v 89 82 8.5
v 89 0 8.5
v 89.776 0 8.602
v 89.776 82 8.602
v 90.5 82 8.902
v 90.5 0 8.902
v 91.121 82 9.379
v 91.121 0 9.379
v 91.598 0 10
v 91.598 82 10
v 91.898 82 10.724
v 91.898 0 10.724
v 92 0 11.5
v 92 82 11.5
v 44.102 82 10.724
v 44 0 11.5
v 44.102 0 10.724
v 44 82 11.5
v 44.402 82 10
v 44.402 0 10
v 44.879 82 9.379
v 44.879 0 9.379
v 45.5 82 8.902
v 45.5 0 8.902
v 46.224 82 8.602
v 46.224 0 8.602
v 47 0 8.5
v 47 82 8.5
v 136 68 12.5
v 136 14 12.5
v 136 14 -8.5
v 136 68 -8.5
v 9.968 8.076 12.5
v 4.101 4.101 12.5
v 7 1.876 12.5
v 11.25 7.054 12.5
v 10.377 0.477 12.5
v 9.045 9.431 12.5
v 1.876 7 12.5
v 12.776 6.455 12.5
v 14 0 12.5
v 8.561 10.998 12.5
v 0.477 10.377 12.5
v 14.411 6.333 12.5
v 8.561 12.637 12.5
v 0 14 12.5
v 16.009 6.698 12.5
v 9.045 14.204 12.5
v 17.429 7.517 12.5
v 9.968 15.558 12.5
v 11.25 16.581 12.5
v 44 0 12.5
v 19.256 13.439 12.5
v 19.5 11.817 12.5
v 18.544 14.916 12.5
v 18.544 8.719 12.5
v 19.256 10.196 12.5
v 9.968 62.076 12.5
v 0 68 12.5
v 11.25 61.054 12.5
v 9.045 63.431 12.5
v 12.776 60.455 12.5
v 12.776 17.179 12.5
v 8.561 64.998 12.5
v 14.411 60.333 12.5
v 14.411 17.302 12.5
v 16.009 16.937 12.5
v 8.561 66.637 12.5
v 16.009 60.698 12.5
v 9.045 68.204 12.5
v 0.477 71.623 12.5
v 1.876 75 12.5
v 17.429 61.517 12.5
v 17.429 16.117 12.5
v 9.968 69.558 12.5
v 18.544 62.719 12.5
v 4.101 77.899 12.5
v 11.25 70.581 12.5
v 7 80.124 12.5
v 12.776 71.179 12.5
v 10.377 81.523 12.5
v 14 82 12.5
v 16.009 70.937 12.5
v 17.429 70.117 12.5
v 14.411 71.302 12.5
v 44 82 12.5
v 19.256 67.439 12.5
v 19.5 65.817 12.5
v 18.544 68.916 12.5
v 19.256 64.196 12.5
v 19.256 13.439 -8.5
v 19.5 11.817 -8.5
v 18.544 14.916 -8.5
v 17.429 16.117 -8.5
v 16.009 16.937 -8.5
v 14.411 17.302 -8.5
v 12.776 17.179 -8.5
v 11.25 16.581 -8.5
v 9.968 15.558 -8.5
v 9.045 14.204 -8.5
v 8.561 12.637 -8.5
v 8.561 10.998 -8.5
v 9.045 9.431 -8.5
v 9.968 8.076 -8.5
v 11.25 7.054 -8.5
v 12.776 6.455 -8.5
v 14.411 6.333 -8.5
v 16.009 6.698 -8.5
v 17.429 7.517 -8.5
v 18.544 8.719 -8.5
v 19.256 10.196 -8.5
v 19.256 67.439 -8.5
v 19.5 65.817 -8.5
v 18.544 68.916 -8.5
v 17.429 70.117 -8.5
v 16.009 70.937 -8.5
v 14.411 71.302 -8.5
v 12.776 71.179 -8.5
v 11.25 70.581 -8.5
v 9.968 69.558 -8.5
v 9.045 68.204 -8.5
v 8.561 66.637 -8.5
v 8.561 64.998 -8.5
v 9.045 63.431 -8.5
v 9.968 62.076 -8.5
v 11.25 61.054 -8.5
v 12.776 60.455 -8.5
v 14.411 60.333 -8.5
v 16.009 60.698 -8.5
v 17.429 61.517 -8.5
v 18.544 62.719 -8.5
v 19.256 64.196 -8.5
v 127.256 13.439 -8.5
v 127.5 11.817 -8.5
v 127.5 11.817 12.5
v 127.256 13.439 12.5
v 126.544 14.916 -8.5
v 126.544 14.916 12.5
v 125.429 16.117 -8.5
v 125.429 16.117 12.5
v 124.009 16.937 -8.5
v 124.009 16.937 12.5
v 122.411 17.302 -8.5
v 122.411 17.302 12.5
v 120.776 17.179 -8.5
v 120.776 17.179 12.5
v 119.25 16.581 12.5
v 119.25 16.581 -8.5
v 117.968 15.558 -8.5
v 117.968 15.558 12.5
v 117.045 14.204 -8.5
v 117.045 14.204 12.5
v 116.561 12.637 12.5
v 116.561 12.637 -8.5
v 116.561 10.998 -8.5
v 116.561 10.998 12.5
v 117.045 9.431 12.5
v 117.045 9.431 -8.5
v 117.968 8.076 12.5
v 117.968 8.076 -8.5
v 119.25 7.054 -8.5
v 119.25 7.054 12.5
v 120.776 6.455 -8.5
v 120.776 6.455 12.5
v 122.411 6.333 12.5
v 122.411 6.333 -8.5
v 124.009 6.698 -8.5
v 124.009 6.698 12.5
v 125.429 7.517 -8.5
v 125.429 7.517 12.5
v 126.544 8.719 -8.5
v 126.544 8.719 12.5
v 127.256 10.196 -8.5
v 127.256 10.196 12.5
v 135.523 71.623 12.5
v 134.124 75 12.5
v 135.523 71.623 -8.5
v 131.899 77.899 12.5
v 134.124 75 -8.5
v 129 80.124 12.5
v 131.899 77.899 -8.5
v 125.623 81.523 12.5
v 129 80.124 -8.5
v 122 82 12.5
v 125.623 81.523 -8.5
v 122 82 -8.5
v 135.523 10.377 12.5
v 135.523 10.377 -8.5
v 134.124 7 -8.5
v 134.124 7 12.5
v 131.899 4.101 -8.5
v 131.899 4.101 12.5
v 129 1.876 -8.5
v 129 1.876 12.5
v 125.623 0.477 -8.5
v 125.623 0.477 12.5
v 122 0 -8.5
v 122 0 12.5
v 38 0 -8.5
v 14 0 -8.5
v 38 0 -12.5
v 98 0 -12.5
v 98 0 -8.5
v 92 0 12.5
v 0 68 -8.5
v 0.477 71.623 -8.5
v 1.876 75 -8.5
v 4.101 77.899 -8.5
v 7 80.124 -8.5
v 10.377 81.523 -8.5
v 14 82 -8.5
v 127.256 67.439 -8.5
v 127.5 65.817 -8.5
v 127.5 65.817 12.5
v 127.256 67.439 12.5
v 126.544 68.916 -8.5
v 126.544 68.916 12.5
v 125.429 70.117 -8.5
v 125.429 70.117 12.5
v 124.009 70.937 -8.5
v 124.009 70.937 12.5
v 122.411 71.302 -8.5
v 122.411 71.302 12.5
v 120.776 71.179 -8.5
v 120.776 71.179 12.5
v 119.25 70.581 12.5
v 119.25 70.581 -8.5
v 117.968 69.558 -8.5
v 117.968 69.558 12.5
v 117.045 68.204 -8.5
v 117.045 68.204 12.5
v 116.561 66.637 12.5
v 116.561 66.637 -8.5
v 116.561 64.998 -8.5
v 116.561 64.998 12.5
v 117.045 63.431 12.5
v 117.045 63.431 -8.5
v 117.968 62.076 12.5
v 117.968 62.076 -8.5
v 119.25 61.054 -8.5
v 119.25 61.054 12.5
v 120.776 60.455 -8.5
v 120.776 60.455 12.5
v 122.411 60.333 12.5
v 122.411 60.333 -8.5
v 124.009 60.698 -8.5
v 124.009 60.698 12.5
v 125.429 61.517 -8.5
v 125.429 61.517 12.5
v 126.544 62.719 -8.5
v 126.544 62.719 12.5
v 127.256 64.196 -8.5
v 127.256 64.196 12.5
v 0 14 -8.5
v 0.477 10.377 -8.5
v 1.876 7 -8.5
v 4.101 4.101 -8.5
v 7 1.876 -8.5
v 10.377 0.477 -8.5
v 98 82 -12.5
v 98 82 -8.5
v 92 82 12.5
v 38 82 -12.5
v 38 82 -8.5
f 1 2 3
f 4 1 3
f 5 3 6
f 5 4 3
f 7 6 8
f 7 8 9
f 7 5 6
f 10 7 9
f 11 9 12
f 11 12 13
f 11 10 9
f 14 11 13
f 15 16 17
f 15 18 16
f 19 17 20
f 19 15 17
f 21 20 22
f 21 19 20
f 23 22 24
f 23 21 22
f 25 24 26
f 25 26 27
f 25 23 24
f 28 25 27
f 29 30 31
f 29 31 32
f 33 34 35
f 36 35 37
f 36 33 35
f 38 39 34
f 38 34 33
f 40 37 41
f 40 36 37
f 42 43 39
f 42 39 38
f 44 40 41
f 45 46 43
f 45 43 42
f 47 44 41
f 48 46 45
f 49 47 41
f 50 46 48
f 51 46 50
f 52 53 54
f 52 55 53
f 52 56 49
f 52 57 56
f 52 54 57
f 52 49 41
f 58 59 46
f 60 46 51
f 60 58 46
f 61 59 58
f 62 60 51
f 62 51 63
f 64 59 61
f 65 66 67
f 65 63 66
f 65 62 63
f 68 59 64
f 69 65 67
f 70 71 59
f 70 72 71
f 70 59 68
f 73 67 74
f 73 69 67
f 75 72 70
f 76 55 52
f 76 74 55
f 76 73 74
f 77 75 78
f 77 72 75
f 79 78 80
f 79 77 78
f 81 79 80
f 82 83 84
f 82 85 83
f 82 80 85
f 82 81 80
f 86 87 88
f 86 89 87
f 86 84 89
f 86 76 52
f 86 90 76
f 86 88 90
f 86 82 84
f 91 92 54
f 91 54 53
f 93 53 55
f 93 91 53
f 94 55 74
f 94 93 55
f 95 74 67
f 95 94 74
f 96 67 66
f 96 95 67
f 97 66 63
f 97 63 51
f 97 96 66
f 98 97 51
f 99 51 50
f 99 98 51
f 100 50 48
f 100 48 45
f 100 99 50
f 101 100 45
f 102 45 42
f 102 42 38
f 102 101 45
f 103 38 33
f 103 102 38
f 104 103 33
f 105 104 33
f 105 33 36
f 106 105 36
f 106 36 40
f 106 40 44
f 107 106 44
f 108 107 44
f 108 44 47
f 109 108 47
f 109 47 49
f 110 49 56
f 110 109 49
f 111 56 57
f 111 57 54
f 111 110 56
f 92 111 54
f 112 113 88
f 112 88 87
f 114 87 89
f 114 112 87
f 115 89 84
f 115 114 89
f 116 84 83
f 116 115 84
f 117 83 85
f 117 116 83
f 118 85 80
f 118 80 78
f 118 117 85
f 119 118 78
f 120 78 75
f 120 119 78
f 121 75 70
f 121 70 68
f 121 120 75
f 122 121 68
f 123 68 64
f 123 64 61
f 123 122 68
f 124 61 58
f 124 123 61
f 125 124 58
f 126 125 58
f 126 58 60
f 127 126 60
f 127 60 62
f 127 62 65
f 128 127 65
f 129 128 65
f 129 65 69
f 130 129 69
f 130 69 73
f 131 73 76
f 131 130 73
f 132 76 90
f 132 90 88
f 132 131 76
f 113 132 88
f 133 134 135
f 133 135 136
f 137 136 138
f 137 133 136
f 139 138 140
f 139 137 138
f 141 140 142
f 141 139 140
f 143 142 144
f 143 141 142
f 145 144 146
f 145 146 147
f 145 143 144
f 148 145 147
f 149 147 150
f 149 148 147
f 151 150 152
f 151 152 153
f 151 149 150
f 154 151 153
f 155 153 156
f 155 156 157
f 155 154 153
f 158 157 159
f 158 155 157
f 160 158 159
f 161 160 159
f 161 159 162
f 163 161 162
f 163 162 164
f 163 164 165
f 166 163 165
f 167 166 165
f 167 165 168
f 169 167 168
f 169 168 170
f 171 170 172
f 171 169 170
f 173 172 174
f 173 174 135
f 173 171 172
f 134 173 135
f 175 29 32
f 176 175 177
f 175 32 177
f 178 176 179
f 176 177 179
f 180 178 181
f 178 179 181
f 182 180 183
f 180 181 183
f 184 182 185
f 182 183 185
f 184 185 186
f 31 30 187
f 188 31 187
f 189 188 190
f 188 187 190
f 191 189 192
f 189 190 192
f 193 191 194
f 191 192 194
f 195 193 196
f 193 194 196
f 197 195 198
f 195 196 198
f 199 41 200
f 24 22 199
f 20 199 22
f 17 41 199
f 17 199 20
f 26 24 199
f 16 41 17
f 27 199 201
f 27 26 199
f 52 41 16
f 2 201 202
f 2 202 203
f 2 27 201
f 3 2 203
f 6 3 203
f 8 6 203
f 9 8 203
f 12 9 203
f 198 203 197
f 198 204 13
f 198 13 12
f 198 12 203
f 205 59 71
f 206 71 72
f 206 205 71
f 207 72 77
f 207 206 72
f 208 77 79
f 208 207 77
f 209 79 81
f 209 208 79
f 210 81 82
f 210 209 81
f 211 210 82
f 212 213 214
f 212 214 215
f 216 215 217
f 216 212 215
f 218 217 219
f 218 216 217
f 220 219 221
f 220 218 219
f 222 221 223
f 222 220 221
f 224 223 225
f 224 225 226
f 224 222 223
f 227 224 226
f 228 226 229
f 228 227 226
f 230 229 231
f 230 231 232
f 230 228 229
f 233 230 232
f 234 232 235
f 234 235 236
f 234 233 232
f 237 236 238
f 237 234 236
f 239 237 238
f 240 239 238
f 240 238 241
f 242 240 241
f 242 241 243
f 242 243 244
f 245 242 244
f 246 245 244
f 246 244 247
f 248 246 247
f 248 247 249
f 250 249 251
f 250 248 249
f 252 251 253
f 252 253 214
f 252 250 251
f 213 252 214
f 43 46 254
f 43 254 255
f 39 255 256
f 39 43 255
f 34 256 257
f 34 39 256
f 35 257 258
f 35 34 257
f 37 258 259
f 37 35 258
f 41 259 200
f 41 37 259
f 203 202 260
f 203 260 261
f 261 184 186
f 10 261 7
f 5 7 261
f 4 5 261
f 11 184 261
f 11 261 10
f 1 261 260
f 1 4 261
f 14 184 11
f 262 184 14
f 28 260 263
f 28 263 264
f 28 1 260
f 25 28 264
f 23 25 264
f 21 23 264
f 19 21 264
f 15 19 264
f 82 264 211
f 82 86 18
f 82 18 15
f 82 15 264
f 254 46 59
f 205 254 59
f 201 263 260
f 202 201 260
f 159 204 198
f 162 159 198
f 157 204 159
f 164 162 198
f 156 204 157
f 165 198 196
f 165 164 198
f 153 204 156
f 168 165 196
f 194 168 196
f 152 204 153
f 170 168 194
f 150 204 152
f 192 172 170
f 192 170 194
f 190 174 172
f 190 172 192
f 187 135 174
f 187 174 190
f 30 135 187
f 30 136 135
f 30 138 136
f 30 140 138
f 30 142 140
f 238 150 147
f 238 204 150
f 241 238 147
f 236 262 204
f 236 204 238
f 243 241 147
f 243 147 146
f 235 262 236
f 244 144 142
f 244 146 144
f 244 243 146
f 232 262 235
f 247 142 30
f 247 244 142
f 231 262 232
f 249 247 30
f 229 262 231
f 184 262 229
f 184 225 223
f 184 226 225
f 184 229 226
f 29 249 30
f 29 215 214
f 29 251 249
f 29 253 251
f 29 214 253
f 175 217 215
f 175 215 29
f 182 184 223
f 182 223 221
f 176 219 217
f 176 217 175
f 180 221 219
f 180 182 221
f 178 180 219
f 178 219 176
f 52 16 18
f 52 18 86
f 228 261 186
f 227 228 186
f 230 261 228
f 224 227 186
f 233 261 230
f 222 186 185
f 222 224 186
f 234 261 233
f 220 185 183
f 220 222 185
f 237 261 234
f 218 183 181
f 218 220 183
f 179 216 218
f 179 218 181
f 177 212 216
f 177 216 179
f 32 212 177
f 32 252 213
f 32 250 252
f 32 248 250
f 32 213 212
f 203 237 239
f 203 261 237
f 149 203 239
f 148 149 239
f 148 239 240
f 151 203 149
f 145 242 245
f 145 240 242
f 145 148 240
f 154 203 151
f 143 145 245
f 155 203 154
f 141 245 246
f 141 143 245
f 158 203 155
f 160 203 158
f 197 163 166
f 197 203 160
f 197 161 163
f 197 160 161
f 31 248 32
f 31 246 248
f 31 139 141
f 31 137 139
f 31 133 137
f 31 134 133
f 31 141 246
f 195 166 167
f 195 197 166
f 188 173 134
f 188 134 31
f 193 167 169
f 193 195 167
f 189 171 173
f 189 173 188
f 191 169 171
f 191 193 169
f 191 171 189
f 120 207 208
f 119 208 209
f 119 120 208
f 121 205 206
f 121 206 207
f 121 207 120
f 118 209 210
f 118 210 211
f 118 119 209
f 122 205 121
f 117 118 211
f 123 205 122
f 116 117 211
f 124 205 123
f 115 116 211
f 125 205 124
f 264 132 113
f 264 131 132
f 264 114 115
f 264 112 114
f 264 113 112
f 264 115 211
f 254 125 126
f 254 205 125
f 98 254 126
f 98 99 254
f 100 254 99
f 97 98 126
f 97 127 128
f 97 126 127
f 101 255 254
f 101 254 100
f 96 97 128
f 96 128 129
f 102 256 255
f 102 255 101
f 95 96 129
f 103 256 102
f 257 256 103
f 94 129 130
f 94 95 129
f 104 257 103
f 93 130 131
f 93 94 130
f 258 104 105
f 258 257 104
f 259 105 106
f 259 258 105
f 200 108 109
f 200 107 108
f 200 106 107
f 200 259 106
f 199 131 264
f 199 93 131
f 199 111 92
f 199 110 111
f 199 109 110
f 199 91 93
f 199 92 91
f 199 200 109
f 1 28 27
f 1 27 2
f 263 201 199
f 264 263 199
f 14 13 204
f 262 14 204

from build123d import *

# Parameters (mm, degrees)
F0_W     = 44
F0_H     = 82
F0_R     = 5.5
F0_W_2   = 48
F1_DEPTH = 12.5
F2_R     = 14
F3_W     = 48
F3_H     = 4
F4_DEPTH = 82.001
F5_R     = 3
F6_W     = 38
F6_H     = 4
F7_DEPTH = 82.001


with BuildPart() as f1:
    # F0 (on Top) → F1 (new body, symmetric)
    with BuildSketch(Plane.XY):
        with Locations((22, 41)):
            Rectangle(F0_W, F0_H)
        with Locations((14, 11.8173863739)):
            Circle(F0_R, mode=Mode.SUBTRACT)
        with Locations((14, 65.8173863739)):
            Circle(F0_R, mode=Mode.SUBTRACT)
        with Locations((68, 41)):
            Rectangle(F0_W_2, F0_H)
        with Locations((114, 41)):
            Rectangle(F0_W, F0_H)
        with Locations((122, 11.8173863739)):
            Circle(F0_R, mode=Mode.SUBTRACT)
        with Locations((122, 65.8173863739)):
            Circle(F0_R, mode=Mode.SUBTRACT)
    extrude(amount=F1_DEPTH, both=True)

    # F2
    f2_edges = [f1.edges().sort_by_distance(p)[0] for p in [
        (0, 82, 0),
        (136, 82, 0),
        (136, 0, 0),
        (0, 0, 0),
    ]]
    fillet(f2_edges, radius=F2_R)

    # F3 (on face) → F4 (cut, through all)
    with BuildSketch(Plane.XZ):
        with Locations((68, 10.5)):
            Rectangle(F3_W, F3_H)
    extrude(amount=-F4_DEPTH, mode=Mode.SUBTRACT)

    # F5
    f5_edges = [f1.edges().sort_by_distance(p)[0] for p in [
        (44, 41, 8.5),
        (92, 41, 8.5),
    ]]
    fillet(f5_edges, radius=F5_R)

    # F6 (on face) → F7 (cut, through all)
    with BuildSketch(Plane.XZ):
        with Locations((117, -10.5)):
            Rectangle(F6_W, F6_H)
        with Locations((19, -10.5)):
            Rectangle(F6_W, F6_H)
    extrude(amount=-F7_DEPTH, mode=Mode.SUBTRACT)


solid = f1.part
